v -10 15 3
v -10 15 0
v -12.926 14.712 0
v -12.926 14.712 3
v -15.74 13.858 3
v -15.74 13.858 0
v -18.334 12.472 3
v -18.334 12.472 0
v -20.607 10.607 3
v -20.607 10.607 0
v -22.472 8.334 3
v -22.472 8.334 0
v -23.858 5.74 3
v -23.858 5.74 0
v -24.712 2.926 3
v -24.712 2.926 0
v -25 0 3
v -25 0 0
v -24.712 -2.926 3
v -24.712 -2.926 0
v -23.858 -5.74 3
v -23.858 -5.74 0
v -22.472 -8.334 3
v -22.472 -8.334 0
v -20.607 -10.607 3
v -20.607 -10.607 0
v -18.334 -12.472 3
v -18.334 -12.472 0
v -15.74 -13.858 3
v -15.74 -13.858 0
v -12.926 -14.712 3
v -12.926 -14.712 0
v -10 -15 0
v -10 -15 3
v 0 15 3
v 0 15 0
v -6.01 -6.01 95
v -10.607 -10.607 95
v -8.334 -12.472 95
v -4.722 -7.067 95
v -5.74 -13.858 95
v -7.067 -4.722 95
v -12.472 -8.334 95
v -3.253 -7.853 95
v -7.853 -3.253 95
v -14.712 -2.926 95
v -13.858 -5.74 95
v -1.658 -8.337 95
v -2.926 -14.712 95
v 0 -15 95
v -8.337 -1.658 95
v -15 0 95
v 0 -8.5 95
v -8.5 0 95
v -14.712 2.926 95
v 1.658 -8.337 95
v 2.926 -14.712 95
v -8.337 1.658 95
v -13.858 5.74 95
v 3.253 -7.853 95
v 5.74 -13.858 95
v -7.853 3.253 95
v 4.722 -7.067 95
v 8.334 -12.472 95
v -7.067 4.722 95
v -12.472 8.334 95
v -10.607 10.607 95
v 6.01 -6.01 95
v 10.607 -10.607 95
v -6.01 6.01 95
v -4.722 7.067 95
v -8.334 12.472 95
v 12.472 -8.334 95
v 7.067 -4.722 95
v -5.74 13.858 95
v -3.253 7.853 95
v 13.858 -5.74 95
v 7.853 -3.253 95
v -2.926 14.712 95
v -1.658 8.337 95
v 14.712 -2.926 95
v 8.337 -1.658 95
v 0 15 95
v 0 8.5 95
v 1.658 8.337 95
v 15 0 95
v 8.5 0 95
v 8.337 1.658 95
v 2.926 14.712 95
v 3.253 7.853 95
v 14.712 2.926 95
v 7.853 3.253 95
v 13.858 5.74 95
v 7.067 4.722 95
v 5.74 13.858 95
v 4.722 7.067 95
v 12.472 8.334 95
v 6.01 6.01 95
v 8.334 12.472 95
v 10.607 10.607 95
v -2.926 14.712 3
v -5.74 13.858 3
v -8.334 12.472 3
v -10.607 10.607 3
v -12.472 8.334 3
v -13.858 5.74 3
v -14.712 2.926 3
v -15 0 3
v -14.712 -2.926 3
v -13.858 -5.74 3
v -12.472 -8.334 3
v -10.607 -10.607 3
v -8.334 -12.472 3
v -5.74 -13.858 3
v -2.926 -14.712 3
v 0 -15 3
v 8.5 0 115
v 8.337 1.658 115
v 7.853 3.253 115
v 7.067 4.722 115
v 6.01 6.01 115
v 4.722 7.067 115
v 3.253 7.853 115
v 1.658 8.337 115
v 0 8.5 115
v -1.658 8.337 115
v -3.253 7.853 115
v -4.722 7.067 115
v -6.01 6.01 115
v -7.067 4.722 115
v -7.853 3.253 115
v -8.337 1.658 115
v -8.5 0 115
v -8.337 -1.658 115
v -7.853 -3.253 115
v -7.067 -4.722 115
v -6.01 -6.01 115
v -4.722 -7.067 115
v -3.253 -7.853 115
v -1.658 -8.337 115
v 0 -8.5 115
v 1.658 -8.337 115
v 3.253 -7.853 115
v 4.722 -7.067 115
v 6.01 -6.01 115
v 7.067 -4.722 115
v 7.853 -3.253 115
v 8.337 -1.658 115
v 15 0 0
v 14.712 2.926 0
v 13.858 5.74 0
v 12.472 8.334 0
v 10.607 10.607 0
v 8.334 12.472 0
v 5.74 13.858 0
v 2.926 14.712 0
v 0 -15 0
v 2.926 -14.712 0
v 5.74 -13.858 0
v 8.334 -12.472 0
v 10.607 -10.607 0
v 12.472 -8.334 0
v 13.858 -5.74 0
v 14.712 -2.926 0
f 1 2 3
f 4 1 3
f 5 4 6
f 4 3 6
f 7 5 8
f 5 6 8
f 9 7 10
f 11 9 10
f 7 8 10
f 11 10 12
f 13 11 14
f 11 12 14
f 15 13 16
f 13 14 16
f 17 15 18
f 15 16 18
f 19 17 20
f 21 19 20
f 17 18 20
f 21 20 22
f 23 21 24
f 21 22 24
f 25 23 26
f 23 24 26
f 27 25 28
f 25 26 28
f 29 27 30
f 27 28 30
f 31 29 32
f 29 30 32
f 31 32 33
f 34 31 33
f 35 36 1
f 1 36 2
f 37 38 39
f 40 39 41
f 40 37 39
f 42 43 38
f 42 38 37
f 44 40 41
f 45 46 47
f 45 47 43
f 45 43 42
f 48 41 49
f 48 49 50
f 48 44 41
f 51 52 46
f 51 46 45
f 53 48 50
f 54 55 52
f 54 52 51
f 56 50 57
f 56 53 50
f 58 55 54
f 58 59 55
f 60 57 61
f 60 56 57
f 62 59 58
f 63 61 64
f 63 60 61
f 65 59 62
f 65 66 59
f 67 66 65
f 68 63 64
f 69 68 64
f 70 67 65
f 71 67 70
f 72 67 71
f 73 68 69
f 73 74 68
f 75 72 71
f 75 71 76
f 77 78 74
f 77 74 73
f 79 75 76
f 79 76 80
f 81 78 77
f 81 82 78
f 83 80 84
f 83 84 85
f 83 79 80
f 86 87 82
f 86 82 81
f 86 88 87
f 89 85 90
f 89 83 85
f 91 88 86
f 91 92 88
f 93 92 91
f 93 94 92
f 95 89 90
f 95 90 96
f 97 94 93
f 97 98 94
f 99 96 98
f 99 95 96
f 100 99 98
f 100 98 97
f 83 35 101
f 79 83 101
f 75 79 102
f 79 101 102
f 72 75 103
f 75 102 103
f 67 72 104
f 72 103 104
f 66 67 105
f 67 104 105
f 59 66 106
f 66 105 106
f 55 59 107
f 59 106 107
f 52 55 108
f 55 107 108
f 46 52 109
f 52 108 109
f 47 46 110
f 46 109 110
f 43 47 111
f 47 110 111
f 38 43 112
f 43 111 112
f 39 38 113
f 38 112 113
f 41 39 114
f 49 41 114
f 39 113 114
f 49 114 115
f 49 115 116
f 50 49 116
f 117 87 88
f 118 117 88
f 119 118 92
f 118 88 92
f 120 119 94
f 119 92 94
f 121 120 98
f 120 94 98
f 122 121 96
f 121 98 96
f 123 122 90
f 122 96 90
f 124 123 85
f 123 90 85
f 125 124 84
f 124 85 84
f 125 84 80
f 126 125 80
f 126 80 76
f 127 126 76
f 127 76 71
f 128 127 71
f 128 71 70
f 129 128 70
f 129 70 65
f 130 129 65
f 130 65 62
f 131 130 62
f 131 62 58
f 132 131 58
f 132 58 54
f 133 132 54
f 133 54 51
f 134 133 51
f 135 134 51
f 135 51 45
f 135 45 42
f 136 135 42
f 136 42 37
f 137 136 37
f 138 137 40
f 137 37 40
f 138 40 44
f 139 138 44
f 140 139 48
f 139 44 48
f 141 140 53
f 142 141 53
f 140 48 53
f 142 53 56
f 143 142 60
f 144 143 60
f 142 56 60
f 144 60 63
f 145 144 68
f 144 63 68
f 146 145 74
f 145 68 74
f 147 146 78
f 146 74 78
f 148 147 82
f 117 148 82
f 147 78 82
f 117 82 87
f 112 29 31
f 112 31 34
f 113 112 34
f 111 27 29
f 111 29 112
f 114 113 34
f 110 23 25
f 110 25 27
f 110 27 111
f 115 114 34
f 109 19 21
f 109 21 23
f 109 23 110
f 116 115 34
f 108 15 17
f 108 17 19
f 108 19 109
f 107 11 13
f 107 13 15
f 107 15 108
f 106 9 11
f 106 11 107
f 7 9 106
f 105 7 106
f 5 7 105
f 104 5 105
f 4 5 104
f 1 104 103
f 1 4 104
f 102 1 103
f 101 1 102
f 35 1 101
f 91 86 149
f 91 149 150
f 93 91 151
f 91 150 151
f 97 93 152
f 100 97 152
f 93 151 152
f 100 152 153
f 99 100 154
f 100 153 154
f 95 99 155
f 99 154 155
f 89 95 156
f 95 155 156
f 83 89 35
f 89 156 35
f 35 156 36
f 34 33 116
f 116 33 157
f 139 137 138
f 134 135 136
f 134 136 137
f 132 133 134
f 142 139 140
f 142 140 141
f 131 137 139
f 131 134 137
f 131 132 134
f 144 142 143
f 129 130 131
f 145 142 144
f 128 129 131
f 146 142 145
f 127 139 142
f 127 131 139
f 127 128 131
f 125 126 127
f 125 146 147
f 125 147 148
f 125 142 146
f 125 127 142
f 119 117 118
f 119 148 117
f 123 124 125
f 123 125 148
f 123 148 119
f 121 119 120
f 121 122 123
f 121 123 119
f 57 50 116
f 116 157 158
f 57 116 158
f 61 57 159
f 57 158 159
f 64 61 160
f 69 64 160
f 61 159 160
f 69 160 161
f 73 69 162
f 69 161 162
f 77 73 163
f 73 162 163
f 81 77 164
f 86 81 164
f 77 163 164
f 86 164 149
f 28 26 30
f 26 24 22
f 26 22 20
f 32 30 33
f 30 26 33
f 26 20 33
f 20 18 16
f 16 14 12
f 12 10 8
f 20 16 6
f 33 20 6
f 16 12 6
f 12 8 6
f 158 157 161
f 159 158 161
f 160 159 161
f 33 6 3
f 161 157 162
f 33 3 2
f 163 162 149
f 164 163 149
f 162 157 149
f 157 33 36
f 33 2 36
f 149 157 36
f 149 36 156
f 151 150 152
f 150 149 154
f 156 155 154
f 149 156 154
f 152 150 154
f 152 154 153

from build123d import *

# Parameters (mm, degrees)
F1_DEPTH = 3
F2_DEPTH = 95
F3_DEPTH = 115


with BuildPart() as f1:
    # F0 (on Top) → F1 (new body)
    with BuildSketch(Plane.XY):
        with BuildLine():
            ThreePointArc((0, -15), (-15, 0), (0, 15))
            Line((0, 15), (-10, 15))
            ThreePointArc((-10, 15), (-25, 0), (-10, -15))
            Line((-10, -15), (0, -15))
        make_face()
        with BuildLine():
            ThreePointArc((0, -15), (10.606602, -10.606602), (15, 0))
            ThreePointArc((15, 0), (10.606602, 10.606602), (0, 15))
            ThreePointArc((0, 15), (-15, 0), (0, -15))
        make_face()
        with BuildLine():
            ThreePointArc((-8.5, 0), (0, 8.5), (8.5, 0))
            ThreePointArc((8.5, 0), (0, -8.5), (-8.5, 0))
        make_face(mode=Mode.SUBTRACT)
        with BuildLine():
            ThreePointArc((-8.5, 0), (0, -8.5), (8.5, 0))
            ThreePointArc((8.5, 0), (0, 8.5), (-8.5, 0))
        make_face()
    extrude(amount=F1_DEPTH)

    # F0 (on Top) → F2 (join)
    with BuildSketch(Plane.XY):
        with BuildLine():
            ThreePointArc((0, -15), (10.606602, -10.606602), (15, 0))
            ThreePointArc((15, 0), (10.606602, 10.606602), (0, 15))
            ThreePointArc((0, 15), (-15, 0), (0, -15))
        make_face()
        with BuildLine():
            ThreePointArc((-8.5, 0), (0, 8.5), (8.5, 0))
            ThreePointArc((8.5, 0), (0, -8.5), (-8.5, 0))
        make_face(mode=Mode.SUBTRACT)
        with BuildLine():
            ThreePointArc((-8.5, 0), (0, -8.5), (8.5, 0))
            ThreePointArc((8.5, 0), (0, 8.5), (-8.5, 0))
        make_face()
    extrude(amount=F2_DEPTH)

    # F0 (on Top) → F3 (join)
    with BuildSketch(Plane.XY):
        with BuildLine():
            ThreePointArc((-8.5, 0), (0, -8.5), (8.5, 0))
            ThreePointArc((8.5, 0), (0, 8.5), (-8.5, 0))
        make_face()
    extrude(amount=F3_DEPTH)


solid = f1.part
